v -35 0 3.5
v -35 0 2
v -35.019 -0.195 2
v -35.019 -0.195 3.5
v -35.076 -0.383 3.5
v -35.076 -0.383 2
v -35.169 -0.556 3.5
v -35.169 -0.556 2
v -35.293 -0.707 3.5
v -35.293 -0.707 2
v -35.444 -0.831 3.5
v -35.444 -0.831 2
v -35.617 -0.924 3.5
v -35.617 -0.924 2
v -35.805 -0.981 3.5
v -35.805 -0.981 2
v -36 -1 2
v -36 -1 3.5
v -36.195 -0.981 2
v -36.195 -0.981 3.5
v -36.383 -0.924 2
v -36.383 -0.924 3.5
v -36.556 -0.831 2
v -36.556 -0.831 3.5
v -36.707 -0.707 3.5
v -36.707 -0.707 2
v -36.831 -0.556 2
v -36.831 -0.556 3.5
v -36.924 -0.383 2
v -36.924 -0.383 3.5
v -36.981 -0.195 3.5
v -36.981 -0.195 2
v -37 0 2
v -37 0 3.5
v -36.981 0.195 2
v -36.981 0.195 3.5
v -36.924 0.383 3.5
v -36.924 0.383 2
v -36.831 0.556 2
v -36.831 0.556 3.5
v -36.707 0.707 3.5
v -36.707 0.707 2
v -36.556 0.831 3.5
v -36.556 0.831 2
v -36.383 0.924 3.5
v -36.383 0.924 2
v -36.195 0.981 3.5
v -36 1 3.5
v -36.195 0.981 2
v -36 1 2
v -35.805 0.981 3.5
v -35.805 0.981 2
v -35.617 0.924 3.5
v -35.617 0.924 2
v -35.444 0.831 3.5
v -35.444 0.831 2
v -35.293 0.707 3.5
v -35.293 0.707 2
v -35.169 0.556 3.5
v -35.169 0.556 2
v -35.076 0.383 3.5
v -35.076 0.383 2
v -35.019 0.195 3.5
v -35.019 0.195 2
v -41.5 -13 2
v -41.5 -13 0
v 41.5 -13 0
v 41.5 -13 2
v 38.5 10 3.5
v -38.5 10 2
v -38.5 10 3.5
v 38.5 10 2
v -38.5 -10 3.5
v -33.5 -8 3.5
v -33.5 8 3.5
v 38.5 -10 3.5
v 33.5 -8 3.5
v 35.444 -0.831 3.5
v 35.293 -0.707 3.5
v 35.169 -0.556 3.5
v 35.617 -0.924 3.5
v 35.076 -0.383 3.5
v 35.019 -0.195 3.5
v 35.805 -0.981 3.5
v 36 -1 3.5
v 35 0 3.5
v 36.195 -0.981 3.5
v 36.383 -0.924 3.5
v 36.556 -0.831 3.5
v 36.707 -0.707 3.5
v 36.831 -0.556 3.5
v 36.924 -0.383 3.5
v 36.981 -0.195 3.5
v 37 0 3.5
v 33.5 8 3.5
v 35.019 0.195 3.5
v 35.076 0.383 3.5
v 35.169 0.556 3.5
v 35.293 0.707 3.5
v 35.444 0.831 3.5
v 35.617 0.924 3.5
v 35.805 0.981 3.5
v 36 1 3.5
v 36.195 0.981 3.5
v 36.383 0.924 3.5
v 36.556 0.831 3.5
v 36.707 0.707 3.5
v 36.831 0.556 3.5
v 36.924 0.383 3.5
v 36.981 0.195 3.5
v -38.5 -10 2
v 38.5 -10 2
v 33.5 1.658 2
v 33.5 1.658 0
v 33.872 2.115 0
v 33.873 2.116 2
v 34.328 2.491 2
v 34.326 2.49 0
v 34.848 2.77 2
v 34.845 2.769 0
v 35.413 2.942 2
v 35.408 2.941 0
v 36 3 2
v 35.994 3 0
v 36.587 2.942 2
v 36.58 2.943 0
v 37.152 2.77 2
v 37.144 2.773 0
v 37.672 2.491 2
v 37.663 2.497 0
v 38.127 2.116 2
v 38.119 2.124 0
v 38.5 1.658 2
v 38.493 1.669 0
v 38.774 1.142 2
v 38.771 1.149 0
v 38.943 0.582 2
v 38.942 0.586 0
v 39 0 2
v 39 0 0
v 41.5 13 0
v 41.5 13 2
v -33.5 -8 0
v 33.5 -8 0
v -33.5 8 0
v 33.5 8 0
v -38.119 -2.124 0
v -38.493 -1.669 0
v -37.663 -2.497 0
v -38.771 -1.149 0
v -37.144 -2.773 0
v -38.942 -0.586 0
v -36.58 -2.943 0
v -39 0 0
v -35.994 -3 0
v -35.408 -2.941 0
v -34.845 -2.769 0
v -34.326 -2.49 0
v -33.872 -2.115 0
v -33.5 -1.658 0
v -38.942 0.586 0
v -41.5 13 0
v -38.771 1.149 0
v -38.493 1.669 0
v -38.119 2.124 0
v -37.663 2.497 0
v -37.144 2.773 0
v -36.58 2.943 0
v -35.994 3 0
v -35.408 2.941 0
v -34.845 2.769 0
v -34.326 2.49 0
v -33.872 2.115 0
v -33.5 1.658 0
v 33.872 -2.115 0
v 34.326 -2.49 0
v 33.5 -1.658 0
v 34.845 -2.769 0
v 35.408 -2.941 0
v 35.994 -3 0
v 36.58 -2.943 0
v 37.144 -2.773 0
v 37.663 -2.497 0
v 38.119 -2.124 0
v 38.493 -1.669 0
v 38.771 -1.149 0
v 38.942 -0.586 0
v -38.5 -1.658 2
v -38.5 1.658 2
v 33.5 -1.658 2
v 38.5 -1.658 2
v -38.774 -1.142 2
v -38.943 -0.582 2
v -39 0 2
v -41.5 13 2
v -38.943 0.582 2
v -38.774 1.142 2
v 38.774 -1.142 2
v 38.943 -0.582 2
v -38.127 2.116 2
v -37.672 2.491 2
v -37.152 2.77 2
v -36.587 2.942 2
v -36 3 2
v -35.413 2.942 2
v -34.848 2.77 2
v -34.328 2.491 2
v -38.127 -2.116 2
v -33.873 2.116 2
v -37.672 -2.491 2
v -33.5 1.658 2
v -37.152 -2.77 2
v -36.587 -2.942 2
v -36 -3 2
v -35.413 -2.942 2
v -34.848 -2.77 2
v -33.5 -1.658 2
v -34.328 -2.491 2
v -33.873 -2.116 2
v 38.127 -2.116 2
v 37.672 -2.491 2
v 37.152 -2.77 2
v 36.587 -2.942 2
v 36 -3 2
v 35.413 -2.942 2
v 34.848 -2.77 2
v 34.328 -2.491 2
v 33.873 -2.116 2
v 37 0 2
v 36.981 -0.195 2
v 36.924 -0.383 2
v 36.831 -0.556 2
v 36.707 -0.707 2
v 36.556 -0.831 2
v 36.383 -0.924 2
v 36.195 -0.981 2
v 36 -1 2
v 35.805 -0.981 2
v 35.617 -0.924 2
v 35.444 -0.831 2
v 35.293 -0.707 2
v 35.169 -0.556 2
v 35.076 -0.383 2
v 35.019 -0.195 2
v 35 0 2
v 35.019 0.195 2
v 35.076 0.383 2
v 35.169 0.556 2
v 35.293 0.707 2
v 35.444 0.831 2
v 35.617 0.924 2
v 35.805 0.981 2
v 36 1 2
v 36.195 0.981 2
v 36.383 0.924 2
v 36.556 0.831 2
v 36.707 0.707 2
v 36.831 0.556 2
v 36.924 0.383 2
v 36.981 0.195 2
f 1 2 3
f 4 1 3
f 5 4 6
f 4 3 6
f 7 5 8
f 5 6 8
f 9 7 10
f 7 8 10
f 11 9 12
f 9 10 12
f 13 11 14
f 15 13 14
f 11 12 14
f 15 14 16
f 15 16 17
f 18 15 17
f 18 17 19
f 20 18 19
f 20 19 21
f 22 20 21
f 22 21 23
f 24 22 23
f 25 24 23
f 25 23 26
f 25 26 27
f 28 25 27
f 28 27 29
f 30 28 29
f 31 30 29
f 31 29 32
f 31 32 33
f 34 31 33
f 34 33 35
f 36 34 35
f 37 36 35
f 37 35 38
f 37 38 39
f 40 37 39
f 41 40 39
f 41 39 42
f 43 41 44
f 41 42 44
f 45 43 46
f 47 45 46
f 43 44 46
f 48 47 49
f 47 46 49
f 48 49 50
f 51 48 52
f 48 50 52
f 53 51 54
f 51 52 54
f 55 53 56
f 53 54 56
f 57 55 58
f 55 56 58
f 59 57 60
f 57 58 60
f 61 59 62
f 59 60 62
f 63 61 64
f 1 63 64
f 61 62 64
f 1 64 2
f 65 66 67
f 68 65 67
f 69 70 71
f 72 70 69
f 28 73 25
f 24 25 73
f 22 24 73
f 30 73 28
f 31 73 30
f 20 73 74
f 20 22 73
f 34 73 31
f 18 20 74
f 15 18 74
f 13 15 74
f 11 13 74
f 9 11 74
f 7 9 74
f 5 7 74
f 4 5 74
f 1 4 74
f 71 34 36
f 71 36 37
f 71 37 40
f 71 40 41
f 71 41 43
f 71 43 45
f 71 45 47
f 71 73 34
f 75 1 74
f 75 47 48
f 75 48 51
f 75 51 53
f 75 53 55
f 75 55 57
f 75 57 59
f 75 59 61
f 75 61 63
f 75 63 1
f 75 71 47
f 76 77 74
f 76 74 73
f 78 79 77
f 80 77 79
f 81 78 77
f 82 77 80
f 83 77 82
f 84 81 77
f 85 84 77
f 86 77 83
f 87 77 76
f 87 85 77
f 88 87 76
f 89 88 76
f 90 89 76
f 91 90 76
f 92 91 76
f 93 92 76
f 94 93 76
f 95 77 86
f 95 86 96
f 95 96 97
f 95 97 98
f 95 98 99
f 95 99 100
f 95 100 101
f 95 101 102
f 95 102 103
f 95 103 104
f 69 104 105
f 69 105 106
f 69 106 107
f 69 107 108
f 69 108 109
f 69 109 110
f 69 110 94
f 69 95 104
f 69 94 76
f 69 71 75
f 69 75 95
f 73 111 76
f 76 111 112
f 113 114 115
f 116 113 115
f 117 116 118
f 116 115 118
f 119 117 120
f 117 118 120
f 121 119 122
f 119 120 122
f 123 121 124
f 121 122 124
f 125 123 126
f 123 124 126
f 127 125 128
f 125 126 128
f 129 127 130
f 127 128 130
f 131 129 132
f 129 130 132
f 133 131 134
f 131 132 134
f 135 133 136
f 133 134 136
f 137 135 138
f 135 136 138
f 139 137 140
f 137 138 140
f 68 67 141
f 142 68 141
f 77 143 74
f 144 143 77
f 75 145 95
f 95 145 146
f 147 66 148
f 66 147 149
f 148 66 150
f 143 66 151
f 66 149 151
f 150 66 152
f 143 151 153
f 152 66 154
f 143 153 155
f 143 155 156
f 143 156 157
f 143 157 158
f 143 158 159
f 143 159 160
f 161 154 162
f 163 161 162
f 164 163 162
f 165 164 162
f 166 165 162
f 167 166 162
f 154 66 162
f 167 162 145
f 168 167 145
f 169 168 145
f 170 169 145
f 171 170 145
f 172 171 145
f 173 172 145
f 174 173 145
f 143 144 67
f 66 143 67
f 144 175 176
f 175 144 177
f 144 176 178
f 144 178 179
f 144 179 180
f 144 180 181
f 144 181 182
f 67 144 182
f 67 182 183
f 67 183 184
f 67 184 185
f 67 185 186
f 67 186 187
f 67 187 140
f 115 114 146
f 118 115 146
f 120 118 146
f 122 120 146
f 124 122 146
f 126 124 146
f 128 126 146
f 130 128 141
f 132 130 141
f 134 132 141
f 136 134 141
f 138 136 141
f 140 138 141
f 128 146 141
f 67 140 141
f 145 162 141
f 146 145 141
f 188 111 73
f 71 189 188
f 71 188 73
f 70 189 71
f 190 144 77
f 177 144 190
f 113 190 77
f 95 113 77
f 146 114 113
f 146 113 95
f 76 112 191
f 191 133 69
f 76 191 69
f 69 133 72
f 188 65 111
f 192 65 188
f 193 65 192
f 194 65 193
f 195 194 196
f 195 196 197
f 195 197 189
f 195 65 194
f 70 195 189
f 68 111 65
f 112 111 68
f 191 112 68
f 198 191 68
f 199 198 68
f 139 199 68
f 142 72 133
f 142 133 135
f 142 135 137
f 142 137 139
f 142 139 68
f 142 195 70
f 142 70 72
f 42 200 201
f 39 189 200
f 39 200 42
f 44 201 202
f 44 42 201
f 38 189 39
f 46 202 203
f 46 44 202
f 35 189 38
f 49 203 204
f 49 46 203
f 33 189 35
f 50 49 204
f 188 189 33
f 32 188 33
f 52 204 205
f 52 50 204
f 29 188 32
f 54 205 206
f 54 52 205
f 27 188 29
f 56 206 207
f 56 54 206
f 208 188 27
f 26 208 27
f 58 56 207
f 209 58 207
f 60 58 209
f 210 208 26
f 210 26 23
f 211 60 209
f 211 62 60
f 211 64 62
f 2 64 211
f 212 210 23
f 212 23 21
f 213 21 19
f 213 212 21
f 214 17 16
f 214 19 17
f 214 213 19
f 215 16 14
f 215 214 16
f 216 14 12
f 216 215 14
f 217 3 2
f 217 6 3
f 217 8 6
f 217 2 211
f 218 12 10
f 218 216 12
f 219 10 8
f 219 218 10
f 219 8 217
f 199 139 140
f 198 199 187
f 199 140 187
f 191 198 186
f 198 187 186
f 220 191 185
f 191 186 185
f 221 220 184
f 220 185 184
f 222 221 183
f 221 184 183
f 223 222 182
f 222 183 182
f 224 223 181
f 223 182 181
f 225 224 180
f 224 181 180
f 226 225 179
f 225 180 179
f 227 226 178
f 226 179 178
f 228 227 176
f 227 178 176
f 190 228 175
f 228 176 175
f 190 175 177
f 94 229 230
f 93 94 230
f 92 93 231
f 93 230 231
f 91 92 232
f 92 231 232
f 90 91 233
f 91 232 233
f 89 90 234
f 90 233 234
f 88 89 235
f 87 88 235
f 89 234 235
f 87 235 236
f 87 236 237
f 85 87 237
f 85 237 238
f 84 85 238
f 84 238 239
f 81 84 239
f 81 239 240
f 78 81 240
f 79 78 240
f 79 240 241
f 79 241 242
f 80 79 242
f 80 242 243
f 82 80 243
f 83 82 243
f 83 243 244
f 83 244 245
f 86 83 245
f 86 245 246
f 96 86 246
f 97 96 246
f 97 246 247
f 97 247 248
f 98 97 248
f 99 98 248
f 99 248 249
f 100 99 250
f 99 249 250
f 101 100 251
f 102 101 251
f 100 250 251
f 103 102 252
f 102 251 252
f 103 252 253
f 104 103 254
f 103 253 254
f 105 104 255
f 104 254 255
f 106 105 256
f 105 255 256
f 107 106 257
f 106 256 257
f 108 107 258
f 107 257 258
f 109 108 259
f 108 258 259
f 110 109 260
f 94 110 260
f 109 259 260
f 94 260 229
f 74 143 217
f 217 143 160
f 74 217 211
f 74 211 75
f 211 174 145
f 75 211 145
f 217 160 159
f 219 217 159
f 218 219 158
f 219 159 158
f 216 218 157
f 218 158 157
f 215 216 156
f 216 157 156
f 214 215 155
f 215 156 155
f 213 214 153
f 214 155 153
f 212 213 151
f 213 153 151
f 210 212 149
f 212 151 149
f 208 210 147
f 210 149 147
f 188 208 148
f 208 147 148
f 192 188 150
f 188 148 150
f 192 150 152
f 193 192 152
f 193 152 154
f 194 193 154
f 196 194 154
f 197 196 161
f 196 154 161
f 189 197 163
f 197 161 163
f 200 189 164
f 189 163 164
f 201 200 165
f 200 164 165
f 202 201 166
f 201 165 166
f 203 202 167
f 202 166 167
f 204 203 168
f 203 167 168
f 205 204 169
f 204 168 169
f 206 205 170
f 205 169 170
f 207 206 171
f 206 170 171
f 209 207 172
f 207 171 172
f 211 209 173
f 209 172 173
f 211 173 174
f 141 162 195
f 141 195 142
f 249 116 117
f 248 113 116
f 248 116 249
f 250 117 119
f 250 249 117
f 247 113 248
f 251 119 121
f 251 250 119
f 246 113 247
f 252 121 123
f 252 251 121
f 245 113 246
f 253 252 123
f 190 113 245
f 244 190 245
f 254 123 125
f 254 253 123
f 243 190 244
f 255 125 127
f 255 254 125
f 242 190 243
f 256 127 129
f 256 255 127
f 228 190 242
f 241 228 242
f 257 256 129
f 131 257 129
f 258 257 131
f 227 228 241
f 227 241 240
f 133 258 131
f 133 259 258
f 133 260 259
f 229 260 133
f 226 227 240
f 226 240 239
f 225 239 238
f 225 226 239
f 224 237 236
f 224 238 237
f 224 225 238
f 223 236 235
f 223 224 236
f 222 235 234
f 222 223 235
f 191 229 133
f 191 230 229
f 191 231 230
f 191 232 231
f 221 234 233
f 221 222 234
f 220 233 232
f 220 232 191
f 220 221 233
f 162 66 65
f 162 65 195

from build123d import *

# Parameters (mm, degrees)
F0_W     = 83
F0_H     = 26
F0_W_2   = 67
F0_H_2   = 16
F1_DEPTH = 2
F2_W     = 77
F2_H     = 20
F2_W_2   = 67
F2_H_2   = 16
F3_DEPTH = 1.5
F4_R     = 1
F5_DEPTH = 25
F6_R     = 1
F7_DEPTH = 2


with BuildPart() as f1:
    # F0 (on Top) → F1 (new body)
    with BuildSketch(Plane.XY):
        Rectangle(F0_W, F0_H)
        Rectangle(F0_W_2, F0_H_2, mode=Mode.SUBTRACT)
    extrude(amount=F1_DEPTH)

    # F2 (on face) → F3 (join)
    with BuildSketch(Plane.XY.offset(2)):
        Rectangle(F2_W, F2_H)
        Rectangle(F2_W_2, F2_H_2, mode=Mode.SUBTRACT)
    extrude(amount=F3_DEPTH)

    # F4 (on face) → F5 (cut)
    with BuildSketch(Plane(origin=(0, 0, 0), x_dir=(1, 0, 0), z_dir=(0, 0, -1))):
        with Locations((-36, 0)):
            Circle(F4_R)
        with Locations((36, 0)):
            Circle(F4_R)
    extrude(amount=-F5_DEPTH, mode=Mode.SUBTRACT)

    # F6 (on face) → F7 (cut)
    with BuildSketch(Plane(origin=(0, 0, 0), x_dir=(1, 0, 0), z_dir=(0, 0, -1))):
        with Locations((-36, 0)):
            Circle(F6_R)
        with Locations((36, 0)):
            Circle(F6_R)
        with BuildLine():
            Line((-33.5, -1.658312), (-33.5, 1.658312))
            ThreePointArc((-33.5, 1.658312), (-39, 0), (-33.5, -1.658312))
        make_face()
        with Locations((-36, 0)):
            Circle(F6_R, mode=Mode.SUBTRACT)
        with BuildLine():
            Line((33.5, -1.658312), (33.5, 1.658312))
            ThreePointArc((33.5, 1.658312), (33, 0), (33.5, -1.658312))
        make_face()
        with BuildLine():
            ThreePointArc((39, 0), (36.866025, 2.872281), (33.5, 1.658312))
            Line((33.5, 1.658312), (33.5, -1.658312))
            ThreePointArc((33.5, -1.658312), (36.866025, -2.872281), (39, 0))
        make_face()
        with Locations((36, 0)):
            Circle(F6_R, mode=Mode.SUBTRACT)
    extrude(amount=-F7_DEPTH, mode=Mode.SUBTRACT)


solid = f1.part
